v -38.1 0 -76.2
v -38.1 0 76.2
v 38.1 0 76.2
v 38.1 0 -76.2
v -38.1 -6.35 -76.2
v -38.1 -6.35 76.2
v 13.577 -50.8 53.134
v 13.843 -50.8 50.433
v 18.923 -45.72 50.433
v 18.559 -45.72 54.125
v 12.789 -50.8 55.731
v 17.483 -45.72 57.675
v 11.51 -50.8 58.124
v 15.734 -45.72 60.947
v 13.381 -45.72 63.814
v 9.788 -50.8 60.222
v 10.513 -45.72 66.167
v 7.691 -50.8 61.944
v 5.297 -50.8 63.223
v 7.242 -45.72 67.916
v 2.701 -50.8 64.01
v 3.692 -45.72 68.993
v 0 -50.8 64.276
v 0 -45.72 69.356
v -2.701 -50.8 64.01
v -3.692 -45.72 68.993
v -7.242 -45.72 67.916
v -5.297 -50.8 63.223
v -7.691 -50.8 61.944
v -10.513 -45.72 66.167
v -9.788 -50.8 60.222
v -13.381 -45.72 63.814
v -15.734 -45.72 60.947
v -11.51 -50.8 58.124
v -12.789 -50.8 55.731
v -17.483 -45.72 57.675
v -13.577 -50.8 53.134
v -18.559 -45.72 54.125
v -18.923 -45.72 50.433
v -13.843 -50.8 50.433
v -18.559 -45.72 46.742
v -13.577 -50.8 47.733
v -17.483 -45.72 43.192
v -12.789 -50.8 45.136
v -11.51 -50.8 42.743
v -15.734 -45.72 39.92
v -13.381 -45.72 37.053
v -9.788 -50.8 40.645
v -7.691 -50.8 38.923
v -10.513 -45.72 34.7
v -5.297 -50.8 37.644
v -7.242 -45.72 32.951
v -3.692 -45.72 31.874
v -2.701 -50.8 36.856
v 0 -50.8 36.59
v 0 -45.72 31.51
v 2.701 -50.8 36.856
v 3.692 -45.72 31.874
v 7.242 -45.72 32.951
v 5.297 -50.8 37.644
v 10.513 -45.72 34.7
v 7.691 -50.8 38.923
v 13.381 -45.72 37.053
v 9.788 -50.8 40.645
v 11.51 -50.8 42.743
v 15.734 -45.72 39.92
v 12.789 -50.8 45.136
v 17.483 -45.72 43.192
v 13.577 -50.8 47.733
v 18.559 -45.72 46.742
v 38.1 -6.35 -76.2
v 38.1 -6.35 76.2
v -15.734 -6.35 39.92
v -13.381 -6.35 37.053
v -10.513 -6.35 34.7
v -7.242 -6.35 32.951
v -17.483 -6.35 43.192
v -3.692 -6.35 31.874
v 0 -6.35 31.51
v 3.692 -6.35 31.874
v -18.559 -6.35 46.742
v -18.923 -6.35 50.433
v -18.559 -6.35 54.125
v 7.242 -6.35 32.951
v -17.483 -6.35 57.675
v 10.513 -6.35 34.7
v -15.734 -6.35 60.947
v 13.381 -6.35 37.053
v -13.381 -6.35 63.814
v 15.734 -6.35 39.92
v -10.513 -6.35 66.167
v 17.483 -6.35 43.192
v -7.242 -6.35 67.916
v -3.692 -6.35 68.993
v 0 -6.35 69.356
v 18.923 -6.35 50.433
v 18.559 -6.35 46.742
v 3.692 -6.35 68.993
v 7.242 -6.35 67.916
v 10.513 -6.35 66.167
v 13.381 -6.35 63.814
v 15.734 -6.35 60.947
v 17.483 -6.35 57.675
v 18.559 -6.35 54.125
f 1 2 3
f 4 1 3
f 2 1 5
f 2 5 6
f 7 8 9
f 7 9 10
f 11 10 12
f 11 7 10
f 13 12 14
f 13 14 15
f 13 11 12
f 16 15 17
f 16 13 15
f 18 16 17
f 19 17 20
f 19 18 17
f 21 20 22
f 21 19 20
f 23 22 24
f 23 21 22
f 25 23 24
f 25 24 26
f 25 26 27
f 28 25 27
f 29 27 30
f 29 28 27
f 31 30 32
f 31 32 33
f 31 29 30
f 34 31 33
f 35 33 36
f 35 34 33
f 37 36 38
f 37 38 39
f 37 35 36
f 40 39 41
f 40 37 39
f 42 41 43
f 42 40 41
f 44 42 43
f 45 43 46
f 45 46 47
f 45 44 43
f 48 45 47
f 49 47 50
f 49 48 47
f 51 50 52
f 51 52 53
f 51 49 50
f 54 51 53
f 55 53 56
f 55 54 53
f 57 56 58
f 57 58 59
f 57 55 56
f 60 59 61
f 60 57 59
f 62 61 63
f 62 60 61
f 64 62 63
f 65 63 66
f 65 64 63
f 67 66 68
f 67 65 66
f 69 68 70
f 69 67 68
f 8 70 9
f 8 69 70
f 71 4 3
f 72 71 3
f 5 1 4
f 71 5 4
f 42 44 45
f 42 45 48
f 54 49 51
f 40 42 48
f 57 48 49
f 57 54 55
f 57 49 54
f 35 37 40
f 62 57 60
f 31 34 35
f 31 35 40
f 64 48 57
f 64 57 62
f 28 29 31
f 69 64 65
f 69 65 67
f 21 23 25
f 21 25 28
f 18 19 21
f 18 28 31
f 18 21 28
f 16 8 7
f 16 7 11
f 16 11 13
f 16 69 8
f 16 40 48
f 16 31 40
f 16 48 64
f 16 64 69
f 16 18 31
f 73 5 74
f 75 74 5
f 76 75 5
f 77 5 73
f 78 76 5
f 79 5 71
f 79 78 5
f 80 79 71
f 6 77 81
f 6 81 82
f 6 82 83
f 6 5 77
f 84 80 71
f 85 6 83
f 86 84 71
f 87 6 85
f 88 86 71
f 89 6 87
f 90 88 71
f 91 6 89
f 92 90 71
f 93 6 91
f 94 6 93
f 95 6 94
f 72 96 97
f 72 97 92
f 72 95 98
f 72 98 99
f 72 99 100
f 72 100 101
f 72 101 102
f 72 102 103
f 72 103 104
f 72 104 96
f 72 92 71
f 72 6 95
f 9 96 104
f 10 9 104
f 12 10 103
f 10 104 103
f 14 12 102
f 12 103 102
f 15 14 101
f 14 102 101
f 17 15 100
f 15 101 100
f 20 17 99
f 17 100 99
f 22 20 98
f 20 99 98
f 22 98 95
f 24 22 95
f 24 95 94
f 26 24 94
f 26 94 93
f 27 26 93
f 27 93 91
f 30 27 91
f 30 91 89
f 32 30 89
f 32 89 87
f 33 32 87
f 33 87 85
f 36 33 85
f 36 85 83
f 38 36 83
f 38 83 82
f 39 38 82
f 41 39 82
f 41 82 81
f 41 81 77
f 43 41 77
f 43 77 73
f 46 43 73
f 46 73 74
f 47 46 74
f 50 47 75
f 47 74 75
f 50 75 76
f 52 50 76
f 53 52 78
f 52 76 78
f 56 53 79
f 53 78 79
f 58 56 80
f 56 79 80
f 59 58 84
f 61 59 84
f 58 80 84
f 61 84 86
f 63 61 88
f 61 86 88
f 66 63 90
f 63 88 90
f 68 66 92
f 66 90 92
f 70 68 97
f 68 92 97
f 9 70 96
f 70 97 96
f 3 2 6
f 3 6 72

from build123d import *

# Parameters (mm, degrees)
F1_R     = 18.923
F2_DEPTH = 50.8
F0_W     = 76.2
F0_H     = 152.4
F3_DEPTH = 6.35
F4_SIZE  = 5.08


with BuildPart() as f2:
    # F1 (on face) → F2 (new body)
    with BuildSketch(Plane.XZ):
        with Locations((0, 50.433476)):
            Circle(F1_R)
    extrude(amount=F2_DEPTH)

    # F0 (on Front) → F3 (join)
    with BuildSketch(Plane.XZ):
        Rectangle(F0_W, F0_H)
    extrude(amount=F3_DEPTH)

    # F4
    f4_edges = [f2.edges().sort_by_distance(p)[0] for p in [
        (-18.923, -50.8, 50.433476),
    ]]
    chamfer(f4_edges, length=F4_SIZE)


solid = f2.part
